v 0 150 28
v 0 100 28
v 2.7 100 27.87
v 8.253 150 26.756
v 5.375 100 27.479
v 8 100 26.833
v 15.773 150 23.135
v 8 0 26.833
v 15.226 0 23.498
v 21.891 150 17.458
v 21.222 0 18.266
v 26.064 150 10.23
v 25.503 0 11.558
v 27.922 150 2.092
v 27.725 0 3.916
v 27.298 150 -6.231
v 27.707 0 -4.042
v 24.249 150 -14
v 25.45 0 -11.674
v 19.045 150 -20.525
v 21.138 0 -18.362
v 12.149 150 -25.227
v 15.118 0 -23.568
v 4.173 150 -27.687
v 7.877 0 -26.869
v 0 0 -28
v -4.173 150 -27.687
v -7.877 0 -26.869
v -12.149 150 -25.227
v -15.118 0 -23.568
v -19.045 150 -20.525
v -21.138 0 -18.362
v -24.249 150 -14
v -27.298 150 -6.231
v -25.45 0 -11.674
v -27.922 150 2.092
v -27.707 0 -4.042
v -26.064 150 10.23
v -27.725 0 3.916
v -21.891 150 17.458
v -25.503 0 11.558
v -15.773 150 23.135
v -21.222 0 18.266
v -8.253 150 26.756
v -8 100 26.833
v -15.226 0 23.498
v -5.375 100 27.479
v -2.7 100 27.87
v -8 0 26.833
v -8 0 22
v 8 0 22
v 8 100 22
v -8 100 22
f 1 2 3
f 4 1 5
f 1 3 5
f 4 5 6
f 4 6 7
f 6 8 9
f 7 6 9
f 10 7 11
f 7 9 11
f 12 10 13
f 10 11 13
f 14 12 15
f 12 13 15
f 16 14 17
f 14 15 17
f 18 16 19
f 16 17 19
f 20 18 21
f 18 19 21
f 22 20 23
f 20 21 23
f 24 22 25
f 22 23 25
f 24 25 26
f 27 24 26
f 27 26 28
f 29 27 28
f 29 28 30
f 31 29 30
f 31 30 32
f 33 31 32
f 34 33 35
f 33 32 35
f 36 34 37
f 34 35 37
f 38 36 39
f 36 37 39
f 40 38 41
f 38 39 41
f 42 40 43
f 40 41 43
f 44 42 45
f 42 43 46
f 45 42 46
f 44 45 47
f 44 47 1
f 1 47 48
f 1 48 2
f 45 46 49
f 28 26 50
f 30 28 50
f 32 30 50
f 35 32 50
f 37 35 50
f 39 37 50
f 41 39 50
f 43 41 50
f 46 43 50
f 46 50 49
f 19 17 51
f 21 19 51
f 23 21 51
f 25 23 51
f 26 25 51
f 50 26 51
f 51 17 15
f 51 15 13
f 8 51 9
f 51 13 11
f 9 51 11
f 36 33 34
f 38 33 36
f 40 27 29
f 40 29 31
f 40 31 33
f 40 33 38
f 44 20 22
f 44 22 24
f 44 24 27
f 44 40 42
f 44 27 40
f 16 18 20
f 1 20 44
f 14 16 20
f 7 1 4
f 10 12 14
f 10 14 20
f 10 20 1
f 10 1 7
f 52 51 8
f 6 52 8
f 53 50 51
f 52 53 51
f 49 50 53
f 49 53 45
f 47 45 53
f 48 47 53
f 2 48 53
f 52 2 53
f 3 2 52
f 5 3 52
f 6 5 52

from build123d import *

# Parameters (mm, degrees)
SKETCH1_R           = 28
BOSS_EXTRUDE1_DEPTH = 150
SKETCH2_W           = 16
SKETCH2_H           = 6
CUT_EXTRUDE1_DEPTH  = 100


with BuildPart() as part:
    # Sketch1 → Boss-Extrude1 (new body)
    with BuildSketch(Plane(origin=(0, 0, 0), x_dir=(1, 0, 0), z_dir=(0, 1, 0))):
        with Locations(Location((0, 0, 0), (0, 0, 270))):
            Circle(SKETCH1_R)
    extrude(amount=BOSS_EXTRUDE1_DEPTH)

    # Sketch2 → Cut-Extrude1 (cut)
    with BuildSketch(Plane.XZ):
        with Locations((0, 25)):
            Rectangle(SKETCH2_W, SKETCH2_H)
    extrude(amount=-CUT_EXTRUDE1_DEPTH, mode=Mode.SUBTRACT)


solid = part.part
